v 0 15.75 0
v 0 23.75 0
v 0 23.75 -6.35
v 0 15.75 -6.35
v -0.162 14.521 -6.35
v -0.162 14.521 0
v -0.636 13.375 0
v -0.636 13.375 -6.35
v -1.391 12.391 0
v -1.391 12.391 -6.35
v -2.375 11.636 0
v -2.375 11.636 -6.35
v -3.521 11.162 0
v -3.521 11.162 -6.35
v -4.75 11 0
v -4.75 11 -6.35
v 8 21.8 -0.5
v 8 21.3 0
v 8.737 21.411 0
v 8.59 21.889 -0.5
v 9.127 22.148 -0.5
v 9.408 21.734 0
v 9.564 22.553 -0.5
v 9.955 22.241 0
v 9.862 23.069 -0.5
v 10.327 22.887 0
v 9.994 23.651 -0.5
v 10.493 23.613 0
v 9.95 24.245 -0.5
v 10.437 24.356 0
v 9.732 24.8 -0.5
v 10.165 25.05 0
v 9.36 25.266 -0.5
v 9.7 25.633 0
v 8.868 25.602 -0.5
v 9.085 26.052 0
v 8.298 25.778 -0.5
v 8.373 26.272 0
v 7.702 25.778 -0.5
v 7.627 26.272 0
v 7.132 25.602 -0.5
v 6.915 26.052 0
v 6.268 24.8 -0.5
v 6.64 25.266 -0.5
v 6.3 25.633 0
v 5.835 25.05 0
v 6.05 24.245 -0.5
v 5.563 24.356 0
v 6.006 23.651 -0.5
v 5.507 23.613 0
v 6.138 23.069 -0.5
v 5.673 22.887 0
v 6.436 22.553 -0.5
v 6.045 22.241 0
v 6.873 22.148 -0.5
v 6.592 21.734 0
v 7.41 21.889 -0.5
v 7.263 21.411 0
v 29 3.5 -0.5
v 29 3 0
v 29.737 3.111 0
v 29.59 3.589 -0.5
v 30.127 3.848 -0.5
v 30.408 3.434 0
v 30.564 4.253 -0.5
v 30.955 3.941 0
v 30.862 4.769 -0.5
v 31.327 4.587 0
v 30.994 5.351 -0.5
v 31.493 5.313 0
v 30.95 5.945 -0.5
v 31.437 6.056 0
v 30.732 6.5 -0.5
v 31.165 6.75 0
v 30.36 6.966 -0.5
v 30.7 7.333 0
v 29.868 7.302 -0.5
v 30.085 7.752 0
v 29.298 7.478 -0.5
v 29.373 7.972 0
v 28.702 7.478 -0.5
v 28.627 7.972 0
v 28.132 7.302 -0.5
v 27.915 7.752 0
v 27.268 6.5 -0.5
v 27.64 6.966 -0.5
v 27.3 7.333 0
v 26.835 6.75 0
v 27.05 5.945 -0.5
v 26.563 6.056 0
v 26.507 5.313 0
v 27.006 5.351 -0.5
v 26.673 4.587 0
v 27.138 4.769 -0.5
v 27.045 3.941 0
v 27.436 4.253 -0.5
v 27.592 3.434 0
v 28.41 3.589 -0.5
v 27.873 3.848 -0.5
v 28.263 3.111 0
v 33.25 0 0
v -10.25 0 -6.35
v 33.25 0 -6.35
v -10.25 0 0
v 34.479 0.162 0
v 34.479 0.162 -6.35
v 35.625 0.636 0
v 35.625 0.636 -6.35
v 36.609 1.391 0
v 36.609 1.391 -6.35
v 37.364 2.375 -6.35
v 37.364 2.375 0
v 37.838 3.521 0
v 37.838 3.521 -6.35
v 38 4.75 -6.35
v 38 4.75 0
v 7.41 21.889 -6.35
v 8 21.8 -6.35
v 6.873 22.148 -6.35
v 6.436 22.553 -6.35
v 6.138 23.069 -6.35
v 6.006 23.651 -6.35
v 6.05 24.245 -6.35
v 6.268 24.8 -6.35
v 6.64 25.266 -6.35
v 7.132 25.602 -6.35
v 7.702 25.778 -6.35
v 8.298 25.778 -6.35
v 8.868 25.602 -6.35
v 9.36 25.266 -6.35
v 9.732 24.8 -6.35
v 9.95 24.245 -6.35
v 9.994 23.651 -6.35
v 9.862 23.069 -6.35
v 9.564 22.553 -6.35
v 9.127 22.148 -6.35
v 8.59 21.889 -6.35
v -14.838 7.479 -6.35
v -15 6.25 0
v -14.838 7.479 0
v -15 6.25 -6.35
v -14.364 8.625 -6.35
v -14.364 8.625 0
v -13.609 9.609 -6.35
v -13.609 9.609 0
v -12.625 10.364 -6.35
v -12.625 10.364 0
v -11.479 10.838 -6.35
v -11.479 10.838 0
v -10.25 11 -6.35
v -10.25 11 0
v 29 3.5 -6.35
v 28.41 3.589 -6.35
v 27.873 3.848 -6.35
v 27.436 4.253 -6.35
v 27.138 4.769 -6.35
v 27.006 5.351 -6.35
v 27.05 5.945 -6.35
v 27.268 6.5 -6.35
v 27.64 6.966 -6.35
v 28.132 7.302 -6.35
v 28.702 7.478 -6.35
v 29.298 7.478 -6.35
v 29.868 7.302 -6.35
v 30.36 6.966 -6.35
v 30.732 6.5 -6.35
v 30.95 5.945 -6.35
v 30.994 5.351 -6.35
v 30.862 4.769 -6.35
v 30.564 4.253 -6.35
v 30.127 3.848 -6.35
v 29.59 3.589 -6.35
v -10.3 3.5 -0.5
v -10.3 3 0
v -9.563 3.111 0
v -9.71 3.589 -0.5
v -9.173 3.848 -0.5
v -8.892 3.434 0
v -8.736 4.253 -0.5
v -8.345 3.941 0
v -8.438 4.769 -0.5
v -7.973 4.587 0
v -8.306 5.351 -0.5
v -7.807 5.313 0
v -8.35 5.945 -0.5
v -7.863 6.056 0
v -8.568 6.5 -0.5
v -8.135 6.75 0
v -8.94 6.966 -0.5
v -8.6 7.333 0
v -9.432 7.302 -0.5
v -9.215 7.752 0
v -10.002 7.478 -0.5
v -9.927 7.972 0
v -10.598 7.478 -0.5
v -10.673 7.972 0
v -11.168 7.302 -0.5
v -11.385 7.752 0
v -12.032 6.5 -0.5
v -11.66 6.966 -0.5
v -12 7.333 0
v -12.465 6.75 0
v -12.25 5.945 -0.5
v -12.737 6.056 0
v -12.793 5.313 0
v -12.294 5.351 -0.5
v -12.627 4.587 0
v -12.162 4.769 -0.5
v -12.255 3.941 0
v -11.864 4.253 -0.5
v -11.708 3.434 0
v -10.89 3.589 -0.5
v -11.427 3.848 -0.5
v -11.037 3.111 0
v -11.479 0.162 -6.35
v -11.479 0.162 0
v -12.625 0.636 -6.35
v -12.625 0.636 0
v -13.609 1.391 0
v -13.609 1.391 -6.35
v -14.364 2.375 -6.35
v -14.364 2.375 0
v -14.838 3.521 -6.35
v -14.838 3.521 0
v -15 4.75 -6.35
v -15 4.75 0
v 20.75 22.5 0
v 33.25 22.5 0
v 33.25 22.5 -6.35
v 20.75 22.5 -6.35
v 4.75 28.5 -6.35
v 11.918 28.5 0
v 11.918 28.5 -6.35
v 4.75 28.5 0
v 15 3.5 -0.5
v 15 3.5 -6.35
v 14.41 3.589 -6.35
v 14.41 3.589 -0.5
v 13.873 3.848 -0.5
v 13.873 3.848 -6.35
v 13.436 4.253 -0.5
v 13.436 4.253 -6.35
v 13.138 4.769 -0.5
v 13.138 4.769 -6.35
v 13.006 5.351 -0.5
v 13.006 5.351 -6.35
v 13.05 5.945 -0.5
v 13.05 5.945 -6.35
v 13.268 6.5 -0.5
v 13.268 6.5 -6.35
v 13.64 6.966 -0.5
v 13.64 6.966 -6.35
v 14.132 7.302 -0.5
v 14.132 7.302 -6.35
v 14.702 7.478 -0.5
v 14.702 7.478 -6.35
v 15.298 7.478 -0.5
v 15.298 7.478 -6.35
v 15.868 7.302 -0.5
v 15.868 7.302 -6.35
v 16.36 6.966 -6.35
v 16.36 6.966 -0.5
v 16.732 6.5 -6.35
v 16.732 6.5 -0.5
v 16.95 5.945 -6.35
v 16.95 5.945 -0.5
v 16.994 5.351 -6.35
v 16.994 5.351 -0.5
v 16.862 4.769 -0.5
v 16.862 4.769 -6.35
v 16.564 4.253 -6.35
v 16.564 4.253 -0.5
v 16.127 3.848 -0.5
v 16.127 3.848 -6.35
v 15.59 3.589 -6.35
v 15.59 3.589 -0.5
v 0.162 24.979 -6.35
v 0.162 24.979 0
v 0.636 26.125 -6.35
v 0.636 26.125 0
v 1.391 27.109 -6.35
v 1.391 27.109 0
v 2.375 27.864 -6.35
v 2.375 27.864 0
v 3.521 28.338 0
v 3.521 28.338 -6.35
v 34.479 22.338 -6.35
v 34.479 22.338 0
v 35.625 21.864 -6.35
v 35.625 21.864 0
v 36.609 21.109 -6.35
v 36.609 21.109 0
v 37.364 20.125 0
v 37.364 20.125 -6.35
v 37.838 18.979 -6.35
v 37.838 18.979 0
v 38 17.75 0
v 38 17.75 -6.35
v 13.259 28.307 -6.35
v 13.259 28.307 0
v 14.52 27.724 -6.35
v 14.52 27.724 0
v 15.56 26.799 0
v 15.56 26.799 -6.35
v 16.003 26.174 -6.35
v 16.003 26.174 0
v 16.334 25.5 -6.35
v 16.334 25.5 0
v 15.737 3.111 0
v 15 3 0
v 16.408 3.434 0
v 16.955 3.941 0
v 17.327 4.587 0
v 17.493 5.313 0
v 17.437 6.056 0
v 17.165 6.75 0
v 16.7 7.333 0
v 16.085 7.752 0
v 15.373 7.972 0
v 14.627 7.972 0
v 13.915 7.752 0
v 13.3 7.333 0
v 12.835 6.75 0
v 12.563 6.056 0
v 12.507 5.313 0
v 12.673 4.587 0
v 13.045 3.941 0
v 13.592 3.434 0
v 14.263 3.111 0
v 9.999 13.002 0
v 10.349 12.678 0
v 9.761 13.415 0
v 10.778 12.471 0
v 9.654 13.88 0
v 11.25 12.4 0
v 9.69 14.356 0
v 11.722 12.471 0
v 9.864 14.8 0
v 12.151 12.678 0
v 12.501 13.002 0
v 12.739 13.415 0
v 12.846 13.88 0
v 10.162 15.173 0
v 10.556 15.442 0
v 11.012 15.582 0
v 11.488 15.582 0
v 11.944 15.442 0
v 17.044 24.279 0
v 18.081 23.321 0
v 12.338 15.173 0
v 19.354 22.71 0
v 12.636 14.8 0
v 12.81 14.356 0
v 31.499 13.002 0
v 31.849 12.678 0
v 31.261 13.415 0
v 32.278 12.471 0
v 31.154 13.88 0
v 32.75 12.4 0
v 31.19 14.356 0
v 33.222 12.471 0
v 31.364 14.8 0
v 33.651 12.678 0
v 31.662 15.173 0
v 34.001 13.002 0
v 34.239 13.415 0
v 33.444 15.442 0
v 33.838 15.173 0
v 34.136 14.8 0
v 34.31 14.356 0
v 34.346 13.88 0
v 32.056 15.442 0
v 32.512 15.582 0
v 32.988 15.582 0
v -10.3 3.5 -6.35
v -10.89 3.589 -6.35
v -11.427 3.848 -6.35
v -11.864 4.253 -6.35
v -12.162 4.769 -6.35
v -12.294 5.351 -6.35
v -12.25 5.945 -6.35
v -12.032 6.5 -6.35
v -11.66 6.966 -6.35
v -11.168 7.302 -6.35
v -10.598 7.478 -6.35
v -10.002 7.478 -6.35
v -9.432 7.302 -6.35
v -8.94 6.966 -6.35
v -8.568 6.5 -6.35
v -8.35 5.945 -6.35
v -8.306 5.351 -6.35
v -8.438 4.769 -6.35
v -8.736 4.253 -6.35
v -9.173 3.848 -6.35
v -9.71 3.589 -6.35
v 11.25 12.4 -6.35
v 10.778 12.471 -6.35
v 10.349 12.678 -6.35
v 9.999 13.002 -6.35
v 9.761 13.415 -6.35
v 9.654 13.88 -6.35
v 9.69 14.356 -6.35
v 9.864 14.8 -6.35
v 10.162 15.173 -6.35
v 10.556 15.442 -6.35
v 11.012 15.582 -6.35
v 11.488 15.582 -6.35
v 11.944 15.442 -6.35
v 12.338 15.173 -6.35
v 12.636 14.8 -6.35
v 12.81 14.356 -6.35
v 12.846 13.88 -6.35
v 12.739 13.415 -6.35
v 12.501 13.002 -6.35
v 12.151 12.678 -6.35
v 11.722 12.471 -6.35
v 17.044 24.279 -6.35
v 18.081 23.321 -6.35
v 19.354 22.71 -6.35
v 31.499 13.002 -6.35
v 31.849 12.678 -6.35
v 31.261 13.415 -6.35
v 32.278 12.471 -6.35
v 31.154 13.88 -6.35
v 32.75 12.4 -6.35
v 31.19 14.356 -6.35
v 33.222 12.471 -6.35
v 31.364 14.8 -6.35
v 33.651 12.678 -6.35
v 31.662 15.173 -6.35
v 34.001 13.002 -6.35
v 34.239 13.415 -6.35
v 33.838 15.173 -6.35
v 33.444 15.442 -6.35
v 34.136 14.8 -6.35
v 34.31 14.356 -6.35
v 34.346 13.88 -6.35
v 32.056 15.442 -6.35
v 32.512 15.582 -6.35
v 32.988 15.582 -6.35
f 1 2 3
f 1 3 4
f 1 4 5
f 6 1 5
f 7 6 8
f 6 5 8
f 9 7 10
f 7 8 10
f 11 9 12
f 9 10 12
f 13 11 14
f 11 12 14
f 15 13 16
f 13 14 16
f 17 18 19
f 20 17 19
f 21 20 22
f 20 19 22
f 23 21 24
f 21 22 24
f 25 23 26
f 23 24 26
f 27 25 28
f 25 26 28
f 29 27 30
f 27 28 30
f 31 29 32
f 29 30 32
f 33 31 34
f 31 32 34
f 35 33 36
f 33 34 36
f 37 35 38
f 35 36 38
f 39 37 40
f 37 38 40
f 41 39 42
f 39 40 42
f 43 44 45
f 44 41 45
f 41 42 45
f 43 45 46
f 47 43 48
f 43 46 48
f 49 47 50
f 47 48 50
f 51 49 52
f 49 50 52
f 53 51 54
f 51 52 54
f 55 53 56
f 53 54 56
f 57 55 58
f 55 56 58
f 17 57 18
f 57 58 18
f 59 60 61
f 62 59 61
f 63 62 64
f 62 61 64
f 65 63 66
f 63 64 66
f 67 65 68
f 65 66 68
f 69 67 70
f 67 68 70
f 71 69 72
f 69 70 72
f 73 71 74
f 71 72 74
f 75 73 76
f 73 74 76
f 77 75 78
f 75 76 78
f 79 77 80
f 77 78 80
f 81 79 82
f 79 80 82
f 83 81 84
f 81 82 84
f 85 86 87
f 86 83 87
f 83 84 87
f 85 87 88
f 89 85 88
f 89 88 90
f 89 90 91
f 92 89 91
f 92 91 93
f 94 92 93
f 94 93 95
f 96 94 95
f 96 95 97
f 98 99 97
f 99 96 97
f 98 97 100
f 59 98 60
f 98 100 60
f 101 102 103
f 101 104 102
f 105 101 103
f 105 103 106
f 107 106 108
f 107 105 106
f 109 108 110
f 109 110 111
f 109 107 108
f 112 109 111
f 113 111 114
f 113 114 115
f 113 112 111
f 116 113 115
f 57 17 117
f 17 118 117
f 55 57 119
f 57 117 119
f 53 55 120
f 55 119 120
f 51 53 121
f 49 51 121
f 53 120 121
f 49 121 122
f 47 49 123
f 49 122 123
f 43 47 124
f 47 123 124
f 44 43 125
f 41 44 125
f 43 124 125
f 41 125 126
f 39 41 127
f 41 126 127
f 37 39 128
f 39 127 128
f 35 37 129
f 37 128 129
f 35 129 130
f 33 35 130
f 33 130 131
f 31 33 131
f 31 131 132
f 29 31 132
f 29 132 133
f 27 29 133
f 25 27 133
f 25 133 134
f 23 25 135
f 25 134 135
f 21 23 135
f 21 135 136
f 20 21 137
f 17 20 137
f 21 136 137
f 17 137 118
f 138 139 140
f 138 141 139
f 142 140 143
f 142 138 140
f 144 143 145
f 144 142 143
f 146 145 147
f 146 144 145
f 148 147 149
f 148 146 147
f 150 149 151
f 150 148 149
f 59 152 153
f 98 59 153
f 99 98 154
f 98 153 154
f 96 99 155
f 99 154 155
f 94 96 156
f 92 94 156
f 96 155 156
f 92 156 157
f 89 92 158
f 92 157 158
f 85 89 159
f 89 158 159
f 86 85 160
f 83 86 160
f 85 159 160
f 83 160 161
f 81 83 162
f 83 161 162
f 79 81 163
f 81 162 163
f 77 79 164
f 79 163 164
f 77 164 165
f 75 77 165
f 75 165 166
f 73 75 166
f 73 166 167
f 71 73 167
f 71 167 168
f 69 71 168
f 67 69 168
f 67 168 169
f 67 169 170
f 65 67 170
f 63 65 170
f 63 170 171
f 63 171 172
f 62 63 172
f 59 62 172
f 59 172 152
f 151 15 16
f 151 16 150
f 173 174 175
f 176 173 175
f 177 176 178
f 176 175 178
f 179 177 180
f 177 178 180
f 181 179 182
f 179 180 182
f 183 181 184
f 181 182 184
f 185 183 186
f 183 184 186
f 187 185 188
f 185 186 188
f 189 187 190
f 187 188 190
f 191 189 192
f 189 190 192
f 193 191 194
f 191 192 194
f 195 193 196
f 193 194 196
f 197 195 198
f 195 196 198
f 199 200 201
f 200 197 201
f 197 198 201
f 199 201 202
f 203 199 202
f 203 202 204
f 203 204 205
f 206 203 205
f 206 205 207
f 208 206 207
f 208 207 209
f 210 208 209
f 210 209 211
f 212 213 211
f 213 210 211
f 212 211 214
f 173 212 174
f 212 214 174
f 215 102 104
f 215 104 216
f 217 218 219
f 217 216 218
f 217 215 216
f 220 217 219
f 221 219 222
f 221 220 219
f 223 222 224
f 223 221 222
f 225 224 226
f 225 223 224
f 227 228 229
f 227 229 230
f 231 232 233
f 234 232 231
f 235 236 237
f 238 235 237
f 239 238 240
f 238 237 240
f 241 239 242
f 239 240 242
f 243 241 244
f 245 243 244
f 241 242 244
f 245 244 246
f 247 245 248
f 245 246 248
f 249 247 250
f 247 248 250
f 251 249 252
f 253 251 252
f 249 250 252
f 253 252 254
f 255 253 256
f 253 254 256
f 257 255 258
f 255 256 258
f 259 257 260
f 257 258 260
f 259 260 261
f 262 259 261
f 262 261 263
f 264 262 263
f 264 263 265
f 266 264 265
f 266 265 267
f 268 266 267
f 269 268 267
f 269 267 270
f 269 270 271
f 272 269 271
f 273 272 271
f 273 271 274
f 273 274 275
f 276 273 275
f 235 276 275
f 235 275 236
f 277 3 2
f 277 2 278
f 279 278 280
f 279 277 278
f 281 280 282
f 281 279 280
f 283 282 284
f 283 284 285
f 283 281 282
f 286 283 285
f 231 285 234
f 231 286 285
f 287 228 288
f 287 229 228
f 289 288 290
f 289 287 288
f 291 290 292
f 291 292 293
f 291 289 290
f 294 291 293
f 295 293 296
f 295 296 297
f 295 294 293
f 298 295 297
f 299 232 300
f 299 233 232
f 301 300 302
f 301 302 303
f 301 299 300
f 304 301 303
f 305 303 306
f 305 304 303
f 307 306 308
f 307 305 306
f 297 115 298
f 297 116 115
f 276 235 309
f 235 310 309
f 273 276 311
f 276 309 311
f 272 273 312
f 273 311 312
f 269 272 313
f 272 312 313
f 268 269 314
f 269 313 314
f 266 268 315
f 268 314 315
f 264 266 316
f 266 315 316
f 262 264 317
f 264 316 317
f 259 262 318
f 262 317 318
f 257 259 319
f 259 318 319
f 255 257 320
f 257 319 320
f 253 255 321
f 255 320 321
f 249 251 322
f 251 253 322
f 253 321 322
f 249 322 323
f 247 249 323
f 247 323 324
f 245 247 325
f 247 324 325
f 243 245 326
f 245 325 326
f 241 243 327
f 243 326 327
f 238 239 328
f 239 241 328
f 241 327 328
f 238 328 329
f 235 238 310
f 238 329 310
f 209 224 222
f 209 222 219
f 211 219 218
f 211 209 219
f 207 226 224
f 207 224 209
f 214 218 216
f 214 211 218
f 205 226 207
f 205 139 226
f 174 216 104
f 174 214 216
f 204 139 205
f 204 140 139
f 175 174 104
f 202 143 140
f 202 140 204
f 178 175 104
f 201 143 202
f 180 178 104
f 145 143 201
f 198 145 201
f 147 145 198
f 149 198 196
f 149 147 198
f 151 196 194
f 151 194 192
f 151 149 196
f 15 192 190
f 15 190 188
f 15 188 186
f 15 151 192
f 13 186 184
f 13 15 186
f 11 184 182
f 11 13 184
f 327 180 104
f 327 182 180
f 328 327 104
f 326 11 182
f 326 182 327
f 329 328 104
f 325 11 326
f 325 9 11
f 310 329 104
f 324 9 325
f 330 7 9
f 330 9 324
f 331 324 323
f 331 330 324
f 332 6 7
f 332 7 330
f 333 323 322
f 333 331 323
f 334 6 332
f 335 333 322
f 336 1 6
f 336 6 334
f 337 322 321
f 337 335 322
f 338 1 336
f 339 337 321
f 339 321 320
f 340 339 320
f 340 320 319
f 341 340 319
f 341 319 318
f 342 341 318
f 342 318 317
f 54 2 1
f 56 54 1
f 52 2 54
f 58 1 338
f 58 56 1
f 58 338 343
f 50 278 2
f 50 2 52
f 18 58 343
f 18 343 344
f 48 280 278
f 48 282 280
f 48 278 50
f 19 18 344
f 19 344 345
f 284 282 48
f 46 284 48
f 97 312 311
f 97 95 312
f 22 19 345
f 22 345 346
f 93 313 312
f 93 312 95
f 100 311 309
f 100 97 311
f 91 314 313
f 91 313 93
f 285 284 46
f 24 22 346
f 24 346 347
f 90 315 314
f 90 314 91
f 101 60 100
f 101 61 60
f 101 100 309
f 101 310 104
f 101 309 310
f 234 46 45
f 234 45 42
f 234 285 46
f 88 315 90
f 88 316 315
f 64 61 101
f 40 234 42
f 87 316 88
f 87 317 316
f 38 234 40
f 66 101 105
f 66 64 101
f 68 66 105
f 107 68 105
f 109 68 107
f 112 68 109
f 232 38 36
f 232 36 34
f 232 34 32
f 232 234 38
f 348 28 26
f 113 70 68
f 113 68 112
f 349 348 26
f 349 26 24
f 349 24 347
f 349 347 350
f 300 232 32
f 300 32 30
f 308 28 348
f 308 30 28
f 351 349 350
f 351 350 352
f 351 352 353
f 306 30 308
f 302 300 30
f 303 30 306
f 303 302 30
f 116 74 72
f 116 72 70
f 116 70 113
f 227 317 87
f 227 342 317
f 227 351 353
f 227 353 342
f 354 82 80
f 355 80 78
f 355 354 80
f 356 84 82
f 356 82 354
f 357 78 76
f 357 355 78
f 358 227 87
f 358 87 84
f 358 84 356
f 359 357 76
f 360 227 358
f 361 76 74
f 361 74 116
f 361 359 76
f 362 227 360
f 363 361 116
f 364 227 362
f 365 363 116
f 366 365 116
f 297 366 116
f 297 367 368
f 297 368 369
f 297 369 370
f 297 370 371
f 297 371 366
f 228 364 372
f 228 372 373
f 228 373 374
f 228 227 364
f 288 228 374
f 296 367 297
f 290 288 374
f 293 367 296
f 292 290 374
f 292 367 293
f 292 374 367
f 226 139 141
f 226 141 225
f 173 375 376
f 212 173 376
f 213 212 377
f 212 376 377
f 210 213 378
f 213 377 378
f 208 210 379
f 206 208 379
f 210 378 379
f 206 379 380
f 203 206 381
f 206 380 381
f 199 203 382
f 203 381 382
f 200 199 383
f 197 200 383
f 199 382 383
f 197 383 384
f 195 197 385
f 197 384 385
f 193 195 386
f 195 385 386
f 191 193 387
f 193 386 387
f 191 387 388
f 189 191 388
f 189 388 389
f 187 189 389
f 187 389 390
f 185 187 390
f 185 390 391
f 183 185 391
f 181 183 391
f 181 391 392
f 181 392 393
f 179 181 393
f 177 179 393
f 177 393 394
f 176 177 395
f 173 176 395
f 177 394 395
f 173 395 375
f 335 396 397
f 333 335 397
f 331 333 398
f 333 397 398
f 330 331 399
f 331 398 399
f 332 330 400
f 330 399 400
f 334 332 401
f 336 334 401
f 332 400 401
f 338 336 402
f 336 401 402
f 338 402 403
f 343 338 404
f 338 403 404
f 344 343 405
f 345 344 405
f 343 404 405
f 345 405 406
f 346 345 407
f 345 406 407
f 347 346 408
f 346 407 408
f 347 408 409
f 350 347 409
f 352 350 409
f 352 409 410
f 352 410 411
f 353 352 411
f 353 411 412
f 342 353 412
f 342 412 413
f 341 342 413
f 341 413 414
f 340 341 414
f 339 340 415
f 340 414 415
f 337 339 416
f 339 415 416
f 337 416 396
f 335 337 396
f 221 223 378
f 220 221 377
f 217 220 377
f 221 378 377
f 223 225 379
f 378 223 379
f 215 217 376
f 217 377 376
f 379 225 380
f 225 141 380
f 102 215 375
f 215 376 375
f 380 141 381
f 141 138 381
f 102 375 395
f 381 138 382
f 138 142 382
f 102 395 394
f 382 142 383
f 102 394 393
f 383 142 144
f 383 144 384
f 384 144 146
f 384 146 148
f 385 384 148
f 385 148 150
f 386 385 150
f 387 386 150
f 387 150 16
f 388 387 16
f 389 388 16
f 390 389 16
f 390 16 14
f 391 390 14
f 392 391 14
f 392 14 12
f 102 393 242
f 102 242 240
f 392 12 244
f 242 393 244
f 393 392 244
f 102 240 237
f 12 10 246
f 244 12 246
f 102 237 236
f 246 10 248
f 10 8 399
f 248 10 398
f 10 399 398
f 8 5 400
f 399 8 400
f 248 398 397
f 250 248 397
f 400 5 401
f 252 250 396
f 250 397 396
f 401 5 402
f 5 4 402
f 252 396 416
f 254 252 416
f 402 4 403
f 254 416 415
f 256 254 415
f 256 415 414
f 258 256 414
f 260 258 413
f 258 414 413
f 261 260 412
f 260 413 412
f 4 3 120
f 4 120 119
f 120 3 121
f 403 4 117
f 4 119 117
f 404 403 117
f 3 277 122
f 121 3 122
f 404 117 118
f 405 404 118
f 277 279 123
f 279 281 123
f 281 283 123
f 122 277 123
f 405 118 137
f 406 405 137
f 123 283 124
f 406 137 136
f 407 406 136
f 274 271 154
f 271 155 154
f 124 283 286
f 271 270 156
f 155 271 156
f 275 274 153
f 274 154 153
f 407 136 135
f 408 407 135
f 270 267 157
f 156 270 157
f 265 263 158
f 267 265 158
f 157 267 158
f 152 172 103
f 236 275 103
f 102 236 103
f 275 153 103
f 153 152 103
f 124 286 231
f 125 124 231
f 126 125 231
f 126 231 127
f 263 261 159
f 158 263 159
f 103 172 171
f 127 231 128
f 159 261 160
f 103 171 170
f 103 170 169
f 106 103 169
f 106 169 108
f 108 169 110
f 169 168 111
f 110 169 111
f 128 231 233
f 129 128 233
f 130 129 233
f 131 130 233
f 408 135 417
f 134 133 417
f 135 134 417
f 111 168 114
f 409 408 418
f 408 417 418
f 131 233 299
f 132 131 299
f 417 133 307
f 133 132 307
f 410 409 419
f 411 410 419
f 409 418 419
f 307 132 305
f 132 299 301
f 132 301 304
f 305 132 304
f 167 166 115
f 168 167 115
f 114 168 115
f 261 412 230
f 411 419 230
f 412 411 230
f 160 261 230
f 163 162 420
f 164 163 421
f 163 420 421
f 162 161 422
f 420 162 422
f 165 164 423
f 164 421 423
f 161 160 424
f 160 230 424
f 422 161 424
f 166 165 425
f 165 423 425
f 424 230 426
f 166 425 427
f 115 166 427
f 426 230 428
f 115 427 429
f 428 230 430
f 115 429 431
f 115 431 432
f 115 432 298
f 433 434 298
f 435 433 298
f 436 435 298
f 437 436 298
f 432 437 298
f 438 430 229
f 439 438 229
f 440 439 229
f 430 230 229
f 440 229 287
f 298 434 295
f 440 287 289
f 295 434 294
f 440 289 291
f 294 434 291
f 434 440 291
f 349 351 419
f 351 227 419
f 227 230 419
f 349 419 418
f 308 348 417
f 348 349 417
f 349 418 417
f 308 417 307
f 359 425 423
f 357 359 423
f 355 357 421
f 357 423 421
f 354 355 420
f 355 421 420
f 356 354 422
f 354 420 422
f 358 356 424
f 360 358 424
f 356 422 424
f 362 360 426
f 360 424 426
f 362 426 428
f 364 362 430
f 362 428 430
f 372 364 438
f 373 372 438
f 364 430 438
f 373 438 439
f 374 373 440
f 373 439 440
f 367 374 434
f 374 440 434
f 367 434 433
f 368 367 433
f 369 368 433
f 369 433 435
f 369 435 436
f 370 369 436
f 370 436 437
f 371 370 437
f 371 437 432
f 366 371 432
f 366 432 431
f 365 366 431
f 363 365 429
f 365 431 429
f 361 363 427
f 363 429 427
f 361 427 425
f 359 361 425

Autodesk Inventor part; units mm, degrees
ref_plane "YZ Plane" through (0, 0, 0) normal (1, 0, 0) x (0, 1, 0)
ref_plane "XZ Plane" through (0, 0, 0) normal (0, 1, 0) x (-1, 0, 0)
ref_plane "XY Plane" through (0, 0, 0) normal (0, 0, 1) x (1, 0, 0)
sketch "Sketch1" plane through (0, 0, 0) normal (0, 0, 1) x (1, 0, 0)
  line L0 (0, 0) -> (44, 0)
  line L1 (44, 0) -> (44, 22.5)
  line L2 (44, 22.5) -> (0, 22.5)
  line L3 (0, 22.5) -> (0, 0)
  line L4 (29, 5.5) -> (44, 5.5) construction
  line L5 (15, 5.5) -> (0, 5.5) construction
  line L6 (32.75, 14) -> (44, 14) construction
  line L7 (11.25, 14) -> (0, 14) construction
  line L8 (0, 11) -> (-15, 11)
  line L9 (-15, 11) -> (-15, 0)
  line L10 (-15, 0) -> (0, 0)
  line L11 (0, 0) -> (0, 11)
  line L12 (0, 22.5) -> (16, 22.5)
  line L13 (16, 22.5) -> (16, 28.5)
  line L14 (16, 28.5) -> (0, 28.5)
  line L15 (0, 28.5) -> (0, 22.5)
  line L16 (44, 5.5) -> (44, 22.5)
  point P0 (8, 23.8)
  point P1 (-10.3, 5.5)
  point P2 (-15, 5.5)
  point P3 (8, 28.5)
  dimension "d0" = 14
  dimension "d1" = 21.5
  dimension "d2" = 18.3
  dimension "d3" = 18.3
  dimension "d5" = 7
  dimension "d6" = 44
  dimension "d13" = 22.5
  dimension "d28" = 4.7
  dimension "d43" = 5.5
  dimension "d46" = 4.7
extrude "Extrusion1" add sketch "Sketch1" against normal blind 6.35
hole "Hole1" at (15, 5.5, 0) at (29, 5.5, 0) at (8, 23.8, 0) at (-10.3, 5.5, 0) direction (0, 0, -1) diameter 4 end through all countersink diameter 5 countersink angle 90
sketch "Sketch2" plane through (0, 0, 0) normal (0, 0, 1) x (1, 0, 0)
  line L0 (38, 26.3081) -> (49.0183, 26.3081)
  line L1 (49.0183, 26.3081) -> (49.0183, -7.071)
  line L2 (49.0183, -7.071) -> (38, -7.071)
  line L3 (38, -7.071) -> (38, 26.3081)
  line L4 (44, 0) -> (44, 22.5) projected
  point P0 (0, 0)
  dimension "d29" = 6
extrude "Extrusion2" cut sketch "Sketch2" against normal through all
hole "Hole2" at (11.25, 14, 0) at (32.75, 14, 0) direction (0, 0, -1) diameter 3.2 end through all
fillet "Fillet1" radius 4.75 8 edges at (38, 22.5, -3.175) (16, 28.5, -3.175) (0, 28.5, -3.175) (-15, 11, -3.175) (-15, 0, -3.175) (38, 0, -3.175) (0, 11, -3.175) (16, 22.5, -3.175)
equation "\"d46\" = d28"
properties part number "Hotend Mount"
